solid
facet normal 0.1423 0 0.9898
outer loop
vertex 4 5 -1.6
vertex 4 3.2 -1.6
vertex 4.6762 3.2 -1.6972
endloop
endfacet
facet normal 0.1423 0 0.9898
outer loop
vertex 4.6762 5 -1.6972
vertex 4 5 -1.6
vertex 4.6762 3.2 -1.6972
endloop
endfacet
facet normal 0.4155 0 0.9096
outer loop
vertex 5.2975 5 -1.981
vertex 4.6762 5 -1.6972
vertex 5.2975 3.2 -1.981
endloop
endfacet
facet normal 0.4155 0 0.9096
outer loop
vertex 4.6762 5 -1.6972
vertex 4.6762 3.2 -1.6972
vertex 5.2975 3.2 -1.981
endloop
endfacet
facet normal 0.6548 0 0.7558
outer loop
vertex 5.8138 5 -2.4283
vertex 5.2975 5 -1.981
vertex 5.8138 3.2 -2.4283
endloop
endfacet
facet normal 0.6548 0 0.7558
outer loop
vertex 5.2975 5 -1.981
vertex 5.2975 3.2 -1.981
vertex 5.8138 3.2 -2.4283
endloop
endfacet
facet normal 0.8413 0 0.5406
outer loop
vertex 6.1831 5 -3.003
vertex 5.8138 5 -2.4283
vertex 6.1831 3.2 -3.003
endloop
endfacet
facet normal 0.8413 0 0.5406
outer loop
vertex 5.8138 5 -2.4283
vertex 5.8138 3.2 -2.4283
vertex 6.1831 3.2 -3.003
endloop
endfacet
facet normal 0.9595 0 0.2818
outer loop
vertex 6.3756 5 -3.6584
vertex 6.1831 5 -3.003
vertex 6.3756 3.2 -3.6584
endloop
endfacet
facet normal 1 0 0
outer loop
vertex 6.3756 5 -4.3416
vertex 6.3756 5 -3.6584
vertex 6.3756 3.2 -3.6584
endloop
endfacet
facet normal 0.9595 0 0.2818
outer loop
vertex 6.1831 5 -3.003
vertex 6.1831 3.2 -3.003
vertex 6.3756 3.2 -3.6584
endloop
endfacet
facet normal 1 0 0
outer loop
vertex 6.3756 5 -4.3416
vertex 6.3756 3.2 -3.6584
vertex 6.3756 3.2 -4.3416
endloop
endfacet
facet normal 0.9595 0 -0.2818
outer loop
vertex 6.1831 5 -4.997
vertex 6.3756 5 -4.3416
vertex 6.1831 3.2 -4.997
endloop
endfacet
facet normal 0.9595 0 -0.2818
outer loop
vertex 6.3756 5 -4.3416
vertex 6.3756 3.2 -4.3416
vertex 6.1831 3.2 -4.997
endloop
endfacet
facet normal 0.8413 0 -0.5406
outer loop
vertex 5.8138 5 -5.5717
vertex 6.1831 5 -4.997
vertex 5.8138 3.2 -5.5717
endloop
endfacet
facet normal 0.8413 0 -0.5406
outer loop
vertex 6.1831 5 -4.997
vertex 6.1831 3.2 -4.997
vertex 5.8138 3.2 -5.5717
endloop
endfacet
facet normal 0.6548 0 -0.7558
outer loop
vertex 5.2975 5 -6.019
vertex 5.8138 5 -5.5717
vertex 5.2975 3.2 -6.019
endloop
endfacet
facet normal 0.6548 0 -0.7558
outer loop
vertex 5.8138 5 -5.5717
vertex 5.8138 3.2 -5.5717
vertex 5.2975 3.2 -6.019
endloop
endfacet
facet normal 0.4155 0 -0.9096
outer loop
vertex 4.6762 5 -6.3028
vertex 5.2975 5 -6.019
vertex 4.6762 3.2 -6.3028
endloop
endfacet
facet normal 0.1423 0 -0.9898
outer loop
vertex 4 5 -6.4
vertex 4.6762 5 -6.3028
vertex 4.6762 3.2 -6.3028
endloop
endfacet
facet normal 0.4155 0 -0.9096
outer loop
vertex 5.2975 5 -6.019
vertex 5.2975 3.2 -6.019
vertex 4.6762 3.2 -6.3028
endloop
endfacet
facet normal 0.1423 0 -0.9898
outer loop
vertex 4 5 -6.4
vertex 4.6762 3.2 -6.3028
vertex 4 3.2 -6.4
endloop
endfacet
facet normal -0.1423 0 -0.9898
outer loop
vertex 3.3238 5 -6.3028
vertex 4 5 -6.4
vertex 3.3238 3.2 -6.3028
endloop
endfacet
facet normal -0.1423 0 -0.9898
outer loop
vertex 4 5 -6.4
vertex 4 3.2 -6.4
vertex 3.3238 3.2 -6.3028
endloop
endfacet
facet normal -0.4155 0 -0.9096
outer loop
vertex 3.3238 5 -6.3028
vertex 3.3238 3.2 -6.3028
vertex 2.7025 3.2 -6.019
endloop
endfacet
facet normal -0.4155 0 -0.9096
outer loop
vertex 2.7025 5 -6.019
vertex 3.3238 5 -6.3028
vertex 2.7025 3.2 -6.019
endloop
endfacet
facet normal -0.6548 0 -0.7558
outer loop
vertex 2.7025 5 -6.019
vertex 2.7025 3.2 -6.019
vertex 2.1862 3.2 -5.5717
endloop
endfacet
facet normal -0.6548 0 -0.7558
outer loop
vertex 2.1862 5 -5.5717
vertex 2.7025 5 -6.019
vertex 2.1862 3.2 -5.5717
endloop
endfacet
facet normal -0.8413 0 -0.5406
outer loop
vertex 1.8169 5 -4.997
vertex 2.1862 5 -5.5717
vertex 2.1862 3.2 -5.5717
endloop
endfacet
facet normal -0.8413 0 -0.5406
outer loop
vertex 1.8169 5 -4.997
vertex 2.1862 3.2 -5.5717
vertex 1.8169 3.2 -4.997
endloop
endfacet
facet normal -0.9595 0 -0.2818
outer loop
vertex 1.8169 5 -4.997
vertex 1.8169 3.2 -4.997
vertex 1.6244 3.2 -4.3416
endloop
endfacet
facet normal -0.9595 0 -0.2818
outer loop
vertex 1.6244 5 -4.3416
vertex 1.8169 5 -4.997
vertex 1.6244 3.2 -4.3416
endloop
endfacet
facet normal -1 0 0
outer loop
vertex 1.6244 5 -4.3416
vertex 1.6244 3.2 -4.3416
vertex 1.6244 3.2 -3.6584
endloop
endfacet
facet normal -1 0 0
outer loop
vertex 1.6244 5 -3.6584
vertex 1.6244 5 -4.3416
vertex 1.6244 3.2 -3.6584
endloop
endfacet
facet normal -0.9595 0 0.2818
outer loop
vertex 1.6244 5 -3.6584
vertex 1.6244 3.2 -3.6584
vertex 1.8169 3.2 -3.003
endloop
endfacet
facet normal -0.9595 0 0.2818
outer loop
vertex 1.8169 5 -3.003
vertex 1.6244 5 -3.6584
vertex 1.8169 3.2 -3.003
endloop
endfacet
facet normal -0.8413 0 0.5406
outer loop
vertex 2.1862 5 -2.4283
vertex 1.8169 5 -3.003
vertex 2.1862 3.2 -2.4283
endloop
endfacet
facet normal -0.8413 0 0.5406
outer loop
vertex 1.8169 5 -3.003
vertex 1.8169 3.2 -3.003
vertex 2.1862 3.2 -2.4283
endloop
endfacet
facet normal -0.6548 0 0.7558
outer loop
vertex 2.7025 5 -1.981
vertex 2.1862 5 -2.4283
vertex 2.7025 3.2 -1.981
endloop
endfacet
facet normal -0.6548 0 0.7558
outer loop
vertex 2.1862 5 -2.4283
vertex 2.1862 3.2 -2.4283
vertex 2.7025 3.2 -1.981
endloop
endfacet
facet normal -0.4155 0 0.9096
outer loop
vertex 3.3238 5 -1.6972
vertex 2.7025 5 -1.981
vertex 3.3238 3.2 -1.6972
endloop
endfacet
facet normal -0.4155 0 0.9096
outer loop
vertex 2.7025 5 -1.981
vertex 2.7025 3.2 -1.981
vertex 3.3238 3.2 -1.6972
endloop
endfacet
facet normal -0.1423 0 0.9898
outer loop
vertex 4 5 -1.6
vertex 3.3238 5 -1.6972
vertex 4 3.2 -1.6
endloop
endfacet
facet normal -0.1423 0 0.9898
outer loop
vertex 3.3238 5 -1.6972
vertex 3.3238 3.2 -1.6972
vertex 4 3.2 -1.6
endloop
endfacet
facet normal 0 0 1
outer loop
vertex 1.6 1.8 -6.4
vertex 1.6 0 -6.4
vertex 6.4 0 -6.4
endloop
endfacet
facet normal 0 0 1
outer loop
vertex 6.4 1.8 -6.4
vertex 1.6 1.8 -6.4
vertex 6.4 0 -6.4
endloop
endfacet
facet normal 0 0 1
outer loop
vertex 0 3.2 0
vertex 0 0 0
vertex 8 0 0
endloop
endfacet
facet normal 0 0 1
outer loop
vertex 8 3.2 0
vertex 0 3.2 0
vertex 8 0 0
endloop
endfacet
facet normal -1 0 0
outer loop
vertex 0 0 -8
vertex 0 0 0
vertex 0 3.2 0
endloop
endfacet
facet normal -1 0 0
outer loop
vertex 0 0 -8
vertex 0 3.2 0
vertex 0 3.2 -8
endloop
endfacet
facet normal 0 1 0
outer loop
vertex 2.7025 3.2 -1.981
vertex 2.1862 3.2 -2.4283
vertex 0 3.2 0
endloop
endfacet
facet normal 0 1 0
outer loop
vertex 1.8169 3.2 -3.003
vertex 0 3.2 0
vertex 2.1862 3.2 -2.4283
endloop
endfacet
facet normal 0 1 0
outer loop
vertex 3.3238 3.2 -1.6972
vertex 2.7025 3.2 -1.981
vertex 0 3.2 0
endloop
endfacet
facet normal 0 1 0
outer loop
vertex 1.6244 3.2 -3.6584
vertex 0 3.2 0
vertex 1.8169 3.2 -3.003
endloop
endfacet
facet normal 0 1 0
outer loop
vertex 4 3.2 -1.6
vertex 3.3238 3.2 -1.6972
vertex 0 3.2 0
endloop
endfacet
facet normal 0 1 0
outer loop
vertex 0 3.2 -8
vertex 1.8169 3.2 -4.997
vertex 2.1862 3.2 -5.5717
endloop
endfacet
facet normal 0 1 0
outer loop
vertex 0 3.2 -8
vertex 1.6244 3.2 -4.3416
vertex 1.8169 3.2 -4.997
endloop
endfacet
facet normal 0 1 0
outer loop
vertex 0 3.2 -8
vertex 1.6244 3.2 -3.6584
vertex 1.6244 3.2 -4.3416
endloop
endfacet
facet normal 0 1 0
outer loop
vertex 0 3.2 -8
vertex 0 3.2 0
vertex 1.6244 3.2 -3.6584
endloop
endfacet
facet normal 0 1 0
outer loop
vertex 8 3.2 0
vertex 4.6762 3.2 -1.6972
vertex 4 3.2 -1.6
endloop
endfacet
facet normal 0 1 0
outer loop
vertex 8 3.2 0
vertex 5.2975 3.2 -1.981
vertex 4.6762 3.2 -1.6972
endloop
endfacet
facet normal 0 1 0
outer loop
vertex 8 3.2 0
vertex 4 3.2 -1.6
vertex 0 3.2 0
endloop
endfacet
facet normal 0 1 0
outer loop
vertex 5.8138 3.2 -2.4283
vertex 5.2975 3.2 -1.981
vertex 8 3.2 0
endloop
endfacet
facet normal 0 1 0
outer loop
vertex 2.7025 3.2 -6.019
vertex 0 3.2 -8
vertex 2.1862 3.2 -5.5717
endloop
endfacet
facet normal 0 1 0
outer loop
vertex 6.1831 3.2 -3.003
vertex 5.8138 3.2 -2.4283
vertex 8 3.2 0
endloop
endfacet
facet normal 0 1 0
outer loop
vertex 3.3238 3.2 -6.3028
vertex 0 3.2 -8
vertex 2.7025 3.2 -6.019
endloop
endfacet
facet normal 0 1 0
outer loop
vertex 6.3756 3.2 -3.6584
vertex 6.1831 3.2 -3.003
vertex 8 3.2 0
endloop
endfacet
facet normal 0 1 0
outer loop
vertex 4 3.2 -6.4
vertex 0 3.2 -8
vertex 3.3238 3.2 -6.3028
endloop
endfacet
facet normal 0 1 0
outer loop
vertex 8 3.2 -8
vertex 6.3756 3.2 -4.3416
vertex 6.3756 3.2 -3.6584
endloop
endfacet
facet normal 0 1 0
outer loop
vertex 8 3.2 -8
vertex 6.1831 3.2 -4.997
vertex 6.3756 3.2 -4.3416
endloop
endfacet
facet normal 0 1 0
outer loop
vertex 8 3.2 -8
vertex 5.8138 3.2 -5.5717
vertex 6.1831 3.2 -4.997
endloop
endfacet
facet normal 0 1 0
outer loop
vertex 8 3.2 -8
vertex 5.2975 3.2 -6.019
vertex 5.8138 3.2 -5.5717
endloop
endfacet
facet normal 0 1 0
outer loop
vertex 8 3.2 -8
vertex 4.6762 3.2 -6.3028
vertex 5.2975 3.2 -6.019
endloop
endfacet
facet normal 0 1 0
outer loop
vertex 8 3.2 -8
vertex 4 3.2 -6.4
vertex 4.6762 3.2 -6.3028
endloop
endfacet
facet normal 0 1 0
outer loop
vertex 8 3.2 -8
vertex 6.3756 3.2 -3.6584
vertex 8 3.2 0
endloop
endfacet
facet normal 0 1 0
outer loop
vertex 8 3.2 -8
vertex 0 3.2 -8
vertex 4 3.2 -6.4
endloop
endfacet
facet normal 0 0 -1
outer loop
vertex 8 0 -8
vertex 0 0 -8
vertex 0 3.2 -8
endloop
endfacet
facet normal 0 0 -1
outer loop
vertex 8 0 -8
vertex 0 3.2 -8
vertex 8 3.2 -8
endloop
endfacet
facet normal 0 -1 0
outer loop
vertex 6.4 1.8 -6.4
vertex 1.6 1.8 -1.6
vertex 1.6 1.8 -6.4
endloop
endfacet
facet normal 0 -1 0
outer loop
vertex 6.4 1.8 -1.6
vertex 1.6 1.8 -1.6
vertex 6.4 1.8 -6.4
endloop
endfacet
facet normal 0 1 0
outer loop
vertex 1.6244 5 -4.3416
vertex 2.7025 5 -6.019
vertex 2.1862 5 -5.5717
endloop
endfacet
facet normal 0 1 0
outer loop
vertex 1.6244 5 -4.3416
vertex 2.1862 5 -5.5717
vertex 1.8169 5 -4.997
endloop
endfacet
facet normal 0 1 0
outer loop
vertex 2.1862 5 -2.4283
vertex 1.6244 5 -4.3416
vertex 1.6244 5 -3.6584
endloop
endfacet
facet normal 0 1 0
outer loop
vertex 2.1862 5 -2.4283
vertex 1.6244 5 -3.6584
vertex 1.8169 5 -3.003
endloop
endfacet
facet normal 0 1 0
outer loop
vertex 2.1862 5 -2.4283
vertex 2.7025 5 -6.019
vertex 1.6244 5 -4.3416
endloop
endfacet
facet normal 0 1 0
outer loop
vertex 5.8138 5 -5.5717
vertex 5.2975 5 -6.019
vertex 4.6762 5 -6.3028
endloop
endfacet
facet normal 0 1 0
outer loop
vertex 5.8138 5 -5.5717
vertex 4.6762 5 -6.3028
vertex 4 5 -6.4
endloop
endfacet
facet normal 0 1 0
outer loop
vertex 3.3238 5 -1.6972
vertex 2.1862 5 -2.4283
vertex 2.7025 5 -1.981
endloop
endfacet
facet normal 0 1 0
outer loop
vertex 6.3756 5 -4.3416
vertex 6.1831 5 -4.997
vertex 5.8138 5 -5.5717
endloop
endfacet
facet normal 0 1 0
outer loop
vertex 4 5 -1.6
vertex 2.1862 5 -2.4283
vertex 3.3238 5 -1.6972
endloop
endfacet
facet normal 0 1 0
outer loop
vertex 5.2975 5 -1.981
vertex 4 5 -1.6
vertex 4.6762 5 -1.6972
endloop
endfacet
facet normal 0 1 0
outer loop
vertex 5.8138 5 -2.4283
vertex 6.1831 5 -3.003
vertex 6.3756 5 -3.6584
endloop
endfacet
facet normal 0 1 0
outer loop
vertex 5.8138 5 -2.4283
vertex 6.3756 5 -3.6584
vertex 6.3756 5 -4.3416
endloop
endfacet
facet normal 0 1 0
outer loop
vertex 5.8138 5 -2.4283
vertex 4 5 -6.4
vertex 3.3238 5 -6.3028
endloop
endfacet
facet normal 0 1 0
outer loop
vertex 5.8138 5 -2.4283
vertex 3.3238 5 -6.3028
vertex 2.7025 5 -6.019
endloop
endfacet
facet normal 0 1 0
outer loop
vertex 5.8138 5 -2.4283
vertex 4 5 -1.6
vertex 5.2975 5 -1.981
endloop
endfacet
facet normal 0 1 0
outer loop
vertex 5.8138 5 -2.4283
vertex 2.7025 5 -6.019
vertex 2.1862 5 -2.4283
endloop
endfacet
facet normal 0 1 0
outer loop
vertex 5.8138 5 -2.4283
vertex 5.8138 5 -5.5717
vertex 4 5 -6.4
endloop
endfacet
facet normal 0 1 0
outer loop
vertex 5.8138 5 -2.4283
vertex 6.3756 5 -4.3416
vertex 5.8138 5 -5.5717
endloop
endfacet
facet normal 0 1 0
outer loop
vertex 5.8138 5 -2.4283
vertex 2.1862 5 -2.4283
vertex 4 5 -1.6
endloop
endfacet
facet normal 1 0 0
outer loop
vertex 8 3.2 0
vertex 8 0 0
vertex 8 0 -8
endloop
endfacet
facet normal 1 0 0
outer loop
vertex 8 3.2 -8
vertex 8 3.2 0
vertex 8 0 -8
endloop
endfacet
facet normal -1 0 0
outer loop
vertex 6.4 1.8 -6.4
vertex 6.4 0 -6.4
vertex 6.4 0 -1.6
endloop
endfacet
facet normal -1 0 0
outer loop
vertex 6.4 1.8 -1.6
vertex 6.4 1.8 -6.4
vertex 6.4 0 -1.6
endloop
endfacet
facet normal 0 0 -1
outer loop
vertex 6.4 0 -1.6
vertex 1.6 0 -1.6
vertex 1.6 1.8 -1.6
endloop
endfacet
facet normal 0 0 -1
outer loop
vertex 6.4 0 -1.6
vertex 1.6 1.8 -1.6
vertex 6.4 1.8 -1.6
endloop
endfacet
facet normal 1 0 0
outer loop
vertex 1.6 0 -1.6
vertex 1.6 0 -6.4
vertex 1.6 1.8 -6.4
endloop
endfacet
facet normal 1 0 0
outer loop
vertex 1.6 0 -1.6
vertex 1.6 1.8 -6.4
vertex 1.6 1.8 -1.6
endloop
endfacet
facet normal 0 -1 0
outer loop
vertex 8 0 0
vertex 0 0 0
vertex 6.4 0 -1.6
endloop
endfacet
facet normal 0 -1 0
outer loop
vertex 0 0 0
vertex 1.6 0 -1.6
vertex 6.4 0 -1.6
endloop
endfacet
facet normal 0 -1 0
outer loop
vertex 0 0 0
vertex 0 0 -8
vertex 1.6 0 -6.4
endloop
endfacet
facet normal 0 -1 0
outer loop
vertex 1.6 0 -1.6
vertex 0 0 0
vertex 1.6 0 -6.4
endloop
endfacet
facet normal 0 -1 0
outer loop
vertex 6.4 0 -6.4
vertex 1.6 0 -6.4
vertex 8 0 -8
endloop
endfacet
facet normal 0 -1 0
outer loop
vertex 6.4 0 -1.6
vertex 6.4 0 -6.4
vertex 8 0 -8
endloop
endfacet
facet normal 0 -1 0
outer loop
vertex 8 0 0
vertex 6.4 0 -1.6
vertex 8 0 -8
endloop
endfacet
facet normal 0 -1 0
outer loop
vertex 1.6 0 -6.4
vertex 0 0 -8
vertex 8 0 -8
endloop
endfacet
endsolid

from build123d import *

# Parameters (mm, degrees)
SKETCH1_W           = 8
SKETCH1_H           = 8
BOSS_EXTRUDE1_DEPTH = 3.2
SKETCH2_R           = 2.4
BOSS_EXTRUDE2_DEPTH = 1.8
SKETCH3_W           = 4.8
SKETCH3_H           = 4.8
CUT_EXTRUDE1_DEPTH  = 1.8


with BuildPart() as part:
    # Sketch1 → Boss-Extrude1 (new body)
    with BuildSketch(Plane(origin=(0, 0, 0), x_dir=(1, 0, 0), z_dir=(0, 1, 0))):
        with Locations((4, 4)):
            Rectangle(SKETCH1_W, SKETCH1_H)
    extrude(amount=BOSS_EXTRUDE1_DEPTH)

    # Sketch2 → Boss-Extrude2 (add)
    with BuildSketch(Plane(origin=(0, 3.2, 0), x_dir=(1, 0, 0), z_dir=(0, 1, 0))):
        with Locations((4, 4)):
            Circle(SKETCH2_R)
    extrude(amount=BOSS_EXTRUDE2_DEPTH)

    # Sketch3 → Cut-Extrude1 (cut)
    with BuildSketch(Plane.XZ):
        with Locations((4, -4)):
            Rectangle(SKETCH3_W, SKETCH3_H)
    extrude(amount=-CUT_EXTRUDE1_DEPTH, mode=Mode.SUBTRACT)


solid = part.part
